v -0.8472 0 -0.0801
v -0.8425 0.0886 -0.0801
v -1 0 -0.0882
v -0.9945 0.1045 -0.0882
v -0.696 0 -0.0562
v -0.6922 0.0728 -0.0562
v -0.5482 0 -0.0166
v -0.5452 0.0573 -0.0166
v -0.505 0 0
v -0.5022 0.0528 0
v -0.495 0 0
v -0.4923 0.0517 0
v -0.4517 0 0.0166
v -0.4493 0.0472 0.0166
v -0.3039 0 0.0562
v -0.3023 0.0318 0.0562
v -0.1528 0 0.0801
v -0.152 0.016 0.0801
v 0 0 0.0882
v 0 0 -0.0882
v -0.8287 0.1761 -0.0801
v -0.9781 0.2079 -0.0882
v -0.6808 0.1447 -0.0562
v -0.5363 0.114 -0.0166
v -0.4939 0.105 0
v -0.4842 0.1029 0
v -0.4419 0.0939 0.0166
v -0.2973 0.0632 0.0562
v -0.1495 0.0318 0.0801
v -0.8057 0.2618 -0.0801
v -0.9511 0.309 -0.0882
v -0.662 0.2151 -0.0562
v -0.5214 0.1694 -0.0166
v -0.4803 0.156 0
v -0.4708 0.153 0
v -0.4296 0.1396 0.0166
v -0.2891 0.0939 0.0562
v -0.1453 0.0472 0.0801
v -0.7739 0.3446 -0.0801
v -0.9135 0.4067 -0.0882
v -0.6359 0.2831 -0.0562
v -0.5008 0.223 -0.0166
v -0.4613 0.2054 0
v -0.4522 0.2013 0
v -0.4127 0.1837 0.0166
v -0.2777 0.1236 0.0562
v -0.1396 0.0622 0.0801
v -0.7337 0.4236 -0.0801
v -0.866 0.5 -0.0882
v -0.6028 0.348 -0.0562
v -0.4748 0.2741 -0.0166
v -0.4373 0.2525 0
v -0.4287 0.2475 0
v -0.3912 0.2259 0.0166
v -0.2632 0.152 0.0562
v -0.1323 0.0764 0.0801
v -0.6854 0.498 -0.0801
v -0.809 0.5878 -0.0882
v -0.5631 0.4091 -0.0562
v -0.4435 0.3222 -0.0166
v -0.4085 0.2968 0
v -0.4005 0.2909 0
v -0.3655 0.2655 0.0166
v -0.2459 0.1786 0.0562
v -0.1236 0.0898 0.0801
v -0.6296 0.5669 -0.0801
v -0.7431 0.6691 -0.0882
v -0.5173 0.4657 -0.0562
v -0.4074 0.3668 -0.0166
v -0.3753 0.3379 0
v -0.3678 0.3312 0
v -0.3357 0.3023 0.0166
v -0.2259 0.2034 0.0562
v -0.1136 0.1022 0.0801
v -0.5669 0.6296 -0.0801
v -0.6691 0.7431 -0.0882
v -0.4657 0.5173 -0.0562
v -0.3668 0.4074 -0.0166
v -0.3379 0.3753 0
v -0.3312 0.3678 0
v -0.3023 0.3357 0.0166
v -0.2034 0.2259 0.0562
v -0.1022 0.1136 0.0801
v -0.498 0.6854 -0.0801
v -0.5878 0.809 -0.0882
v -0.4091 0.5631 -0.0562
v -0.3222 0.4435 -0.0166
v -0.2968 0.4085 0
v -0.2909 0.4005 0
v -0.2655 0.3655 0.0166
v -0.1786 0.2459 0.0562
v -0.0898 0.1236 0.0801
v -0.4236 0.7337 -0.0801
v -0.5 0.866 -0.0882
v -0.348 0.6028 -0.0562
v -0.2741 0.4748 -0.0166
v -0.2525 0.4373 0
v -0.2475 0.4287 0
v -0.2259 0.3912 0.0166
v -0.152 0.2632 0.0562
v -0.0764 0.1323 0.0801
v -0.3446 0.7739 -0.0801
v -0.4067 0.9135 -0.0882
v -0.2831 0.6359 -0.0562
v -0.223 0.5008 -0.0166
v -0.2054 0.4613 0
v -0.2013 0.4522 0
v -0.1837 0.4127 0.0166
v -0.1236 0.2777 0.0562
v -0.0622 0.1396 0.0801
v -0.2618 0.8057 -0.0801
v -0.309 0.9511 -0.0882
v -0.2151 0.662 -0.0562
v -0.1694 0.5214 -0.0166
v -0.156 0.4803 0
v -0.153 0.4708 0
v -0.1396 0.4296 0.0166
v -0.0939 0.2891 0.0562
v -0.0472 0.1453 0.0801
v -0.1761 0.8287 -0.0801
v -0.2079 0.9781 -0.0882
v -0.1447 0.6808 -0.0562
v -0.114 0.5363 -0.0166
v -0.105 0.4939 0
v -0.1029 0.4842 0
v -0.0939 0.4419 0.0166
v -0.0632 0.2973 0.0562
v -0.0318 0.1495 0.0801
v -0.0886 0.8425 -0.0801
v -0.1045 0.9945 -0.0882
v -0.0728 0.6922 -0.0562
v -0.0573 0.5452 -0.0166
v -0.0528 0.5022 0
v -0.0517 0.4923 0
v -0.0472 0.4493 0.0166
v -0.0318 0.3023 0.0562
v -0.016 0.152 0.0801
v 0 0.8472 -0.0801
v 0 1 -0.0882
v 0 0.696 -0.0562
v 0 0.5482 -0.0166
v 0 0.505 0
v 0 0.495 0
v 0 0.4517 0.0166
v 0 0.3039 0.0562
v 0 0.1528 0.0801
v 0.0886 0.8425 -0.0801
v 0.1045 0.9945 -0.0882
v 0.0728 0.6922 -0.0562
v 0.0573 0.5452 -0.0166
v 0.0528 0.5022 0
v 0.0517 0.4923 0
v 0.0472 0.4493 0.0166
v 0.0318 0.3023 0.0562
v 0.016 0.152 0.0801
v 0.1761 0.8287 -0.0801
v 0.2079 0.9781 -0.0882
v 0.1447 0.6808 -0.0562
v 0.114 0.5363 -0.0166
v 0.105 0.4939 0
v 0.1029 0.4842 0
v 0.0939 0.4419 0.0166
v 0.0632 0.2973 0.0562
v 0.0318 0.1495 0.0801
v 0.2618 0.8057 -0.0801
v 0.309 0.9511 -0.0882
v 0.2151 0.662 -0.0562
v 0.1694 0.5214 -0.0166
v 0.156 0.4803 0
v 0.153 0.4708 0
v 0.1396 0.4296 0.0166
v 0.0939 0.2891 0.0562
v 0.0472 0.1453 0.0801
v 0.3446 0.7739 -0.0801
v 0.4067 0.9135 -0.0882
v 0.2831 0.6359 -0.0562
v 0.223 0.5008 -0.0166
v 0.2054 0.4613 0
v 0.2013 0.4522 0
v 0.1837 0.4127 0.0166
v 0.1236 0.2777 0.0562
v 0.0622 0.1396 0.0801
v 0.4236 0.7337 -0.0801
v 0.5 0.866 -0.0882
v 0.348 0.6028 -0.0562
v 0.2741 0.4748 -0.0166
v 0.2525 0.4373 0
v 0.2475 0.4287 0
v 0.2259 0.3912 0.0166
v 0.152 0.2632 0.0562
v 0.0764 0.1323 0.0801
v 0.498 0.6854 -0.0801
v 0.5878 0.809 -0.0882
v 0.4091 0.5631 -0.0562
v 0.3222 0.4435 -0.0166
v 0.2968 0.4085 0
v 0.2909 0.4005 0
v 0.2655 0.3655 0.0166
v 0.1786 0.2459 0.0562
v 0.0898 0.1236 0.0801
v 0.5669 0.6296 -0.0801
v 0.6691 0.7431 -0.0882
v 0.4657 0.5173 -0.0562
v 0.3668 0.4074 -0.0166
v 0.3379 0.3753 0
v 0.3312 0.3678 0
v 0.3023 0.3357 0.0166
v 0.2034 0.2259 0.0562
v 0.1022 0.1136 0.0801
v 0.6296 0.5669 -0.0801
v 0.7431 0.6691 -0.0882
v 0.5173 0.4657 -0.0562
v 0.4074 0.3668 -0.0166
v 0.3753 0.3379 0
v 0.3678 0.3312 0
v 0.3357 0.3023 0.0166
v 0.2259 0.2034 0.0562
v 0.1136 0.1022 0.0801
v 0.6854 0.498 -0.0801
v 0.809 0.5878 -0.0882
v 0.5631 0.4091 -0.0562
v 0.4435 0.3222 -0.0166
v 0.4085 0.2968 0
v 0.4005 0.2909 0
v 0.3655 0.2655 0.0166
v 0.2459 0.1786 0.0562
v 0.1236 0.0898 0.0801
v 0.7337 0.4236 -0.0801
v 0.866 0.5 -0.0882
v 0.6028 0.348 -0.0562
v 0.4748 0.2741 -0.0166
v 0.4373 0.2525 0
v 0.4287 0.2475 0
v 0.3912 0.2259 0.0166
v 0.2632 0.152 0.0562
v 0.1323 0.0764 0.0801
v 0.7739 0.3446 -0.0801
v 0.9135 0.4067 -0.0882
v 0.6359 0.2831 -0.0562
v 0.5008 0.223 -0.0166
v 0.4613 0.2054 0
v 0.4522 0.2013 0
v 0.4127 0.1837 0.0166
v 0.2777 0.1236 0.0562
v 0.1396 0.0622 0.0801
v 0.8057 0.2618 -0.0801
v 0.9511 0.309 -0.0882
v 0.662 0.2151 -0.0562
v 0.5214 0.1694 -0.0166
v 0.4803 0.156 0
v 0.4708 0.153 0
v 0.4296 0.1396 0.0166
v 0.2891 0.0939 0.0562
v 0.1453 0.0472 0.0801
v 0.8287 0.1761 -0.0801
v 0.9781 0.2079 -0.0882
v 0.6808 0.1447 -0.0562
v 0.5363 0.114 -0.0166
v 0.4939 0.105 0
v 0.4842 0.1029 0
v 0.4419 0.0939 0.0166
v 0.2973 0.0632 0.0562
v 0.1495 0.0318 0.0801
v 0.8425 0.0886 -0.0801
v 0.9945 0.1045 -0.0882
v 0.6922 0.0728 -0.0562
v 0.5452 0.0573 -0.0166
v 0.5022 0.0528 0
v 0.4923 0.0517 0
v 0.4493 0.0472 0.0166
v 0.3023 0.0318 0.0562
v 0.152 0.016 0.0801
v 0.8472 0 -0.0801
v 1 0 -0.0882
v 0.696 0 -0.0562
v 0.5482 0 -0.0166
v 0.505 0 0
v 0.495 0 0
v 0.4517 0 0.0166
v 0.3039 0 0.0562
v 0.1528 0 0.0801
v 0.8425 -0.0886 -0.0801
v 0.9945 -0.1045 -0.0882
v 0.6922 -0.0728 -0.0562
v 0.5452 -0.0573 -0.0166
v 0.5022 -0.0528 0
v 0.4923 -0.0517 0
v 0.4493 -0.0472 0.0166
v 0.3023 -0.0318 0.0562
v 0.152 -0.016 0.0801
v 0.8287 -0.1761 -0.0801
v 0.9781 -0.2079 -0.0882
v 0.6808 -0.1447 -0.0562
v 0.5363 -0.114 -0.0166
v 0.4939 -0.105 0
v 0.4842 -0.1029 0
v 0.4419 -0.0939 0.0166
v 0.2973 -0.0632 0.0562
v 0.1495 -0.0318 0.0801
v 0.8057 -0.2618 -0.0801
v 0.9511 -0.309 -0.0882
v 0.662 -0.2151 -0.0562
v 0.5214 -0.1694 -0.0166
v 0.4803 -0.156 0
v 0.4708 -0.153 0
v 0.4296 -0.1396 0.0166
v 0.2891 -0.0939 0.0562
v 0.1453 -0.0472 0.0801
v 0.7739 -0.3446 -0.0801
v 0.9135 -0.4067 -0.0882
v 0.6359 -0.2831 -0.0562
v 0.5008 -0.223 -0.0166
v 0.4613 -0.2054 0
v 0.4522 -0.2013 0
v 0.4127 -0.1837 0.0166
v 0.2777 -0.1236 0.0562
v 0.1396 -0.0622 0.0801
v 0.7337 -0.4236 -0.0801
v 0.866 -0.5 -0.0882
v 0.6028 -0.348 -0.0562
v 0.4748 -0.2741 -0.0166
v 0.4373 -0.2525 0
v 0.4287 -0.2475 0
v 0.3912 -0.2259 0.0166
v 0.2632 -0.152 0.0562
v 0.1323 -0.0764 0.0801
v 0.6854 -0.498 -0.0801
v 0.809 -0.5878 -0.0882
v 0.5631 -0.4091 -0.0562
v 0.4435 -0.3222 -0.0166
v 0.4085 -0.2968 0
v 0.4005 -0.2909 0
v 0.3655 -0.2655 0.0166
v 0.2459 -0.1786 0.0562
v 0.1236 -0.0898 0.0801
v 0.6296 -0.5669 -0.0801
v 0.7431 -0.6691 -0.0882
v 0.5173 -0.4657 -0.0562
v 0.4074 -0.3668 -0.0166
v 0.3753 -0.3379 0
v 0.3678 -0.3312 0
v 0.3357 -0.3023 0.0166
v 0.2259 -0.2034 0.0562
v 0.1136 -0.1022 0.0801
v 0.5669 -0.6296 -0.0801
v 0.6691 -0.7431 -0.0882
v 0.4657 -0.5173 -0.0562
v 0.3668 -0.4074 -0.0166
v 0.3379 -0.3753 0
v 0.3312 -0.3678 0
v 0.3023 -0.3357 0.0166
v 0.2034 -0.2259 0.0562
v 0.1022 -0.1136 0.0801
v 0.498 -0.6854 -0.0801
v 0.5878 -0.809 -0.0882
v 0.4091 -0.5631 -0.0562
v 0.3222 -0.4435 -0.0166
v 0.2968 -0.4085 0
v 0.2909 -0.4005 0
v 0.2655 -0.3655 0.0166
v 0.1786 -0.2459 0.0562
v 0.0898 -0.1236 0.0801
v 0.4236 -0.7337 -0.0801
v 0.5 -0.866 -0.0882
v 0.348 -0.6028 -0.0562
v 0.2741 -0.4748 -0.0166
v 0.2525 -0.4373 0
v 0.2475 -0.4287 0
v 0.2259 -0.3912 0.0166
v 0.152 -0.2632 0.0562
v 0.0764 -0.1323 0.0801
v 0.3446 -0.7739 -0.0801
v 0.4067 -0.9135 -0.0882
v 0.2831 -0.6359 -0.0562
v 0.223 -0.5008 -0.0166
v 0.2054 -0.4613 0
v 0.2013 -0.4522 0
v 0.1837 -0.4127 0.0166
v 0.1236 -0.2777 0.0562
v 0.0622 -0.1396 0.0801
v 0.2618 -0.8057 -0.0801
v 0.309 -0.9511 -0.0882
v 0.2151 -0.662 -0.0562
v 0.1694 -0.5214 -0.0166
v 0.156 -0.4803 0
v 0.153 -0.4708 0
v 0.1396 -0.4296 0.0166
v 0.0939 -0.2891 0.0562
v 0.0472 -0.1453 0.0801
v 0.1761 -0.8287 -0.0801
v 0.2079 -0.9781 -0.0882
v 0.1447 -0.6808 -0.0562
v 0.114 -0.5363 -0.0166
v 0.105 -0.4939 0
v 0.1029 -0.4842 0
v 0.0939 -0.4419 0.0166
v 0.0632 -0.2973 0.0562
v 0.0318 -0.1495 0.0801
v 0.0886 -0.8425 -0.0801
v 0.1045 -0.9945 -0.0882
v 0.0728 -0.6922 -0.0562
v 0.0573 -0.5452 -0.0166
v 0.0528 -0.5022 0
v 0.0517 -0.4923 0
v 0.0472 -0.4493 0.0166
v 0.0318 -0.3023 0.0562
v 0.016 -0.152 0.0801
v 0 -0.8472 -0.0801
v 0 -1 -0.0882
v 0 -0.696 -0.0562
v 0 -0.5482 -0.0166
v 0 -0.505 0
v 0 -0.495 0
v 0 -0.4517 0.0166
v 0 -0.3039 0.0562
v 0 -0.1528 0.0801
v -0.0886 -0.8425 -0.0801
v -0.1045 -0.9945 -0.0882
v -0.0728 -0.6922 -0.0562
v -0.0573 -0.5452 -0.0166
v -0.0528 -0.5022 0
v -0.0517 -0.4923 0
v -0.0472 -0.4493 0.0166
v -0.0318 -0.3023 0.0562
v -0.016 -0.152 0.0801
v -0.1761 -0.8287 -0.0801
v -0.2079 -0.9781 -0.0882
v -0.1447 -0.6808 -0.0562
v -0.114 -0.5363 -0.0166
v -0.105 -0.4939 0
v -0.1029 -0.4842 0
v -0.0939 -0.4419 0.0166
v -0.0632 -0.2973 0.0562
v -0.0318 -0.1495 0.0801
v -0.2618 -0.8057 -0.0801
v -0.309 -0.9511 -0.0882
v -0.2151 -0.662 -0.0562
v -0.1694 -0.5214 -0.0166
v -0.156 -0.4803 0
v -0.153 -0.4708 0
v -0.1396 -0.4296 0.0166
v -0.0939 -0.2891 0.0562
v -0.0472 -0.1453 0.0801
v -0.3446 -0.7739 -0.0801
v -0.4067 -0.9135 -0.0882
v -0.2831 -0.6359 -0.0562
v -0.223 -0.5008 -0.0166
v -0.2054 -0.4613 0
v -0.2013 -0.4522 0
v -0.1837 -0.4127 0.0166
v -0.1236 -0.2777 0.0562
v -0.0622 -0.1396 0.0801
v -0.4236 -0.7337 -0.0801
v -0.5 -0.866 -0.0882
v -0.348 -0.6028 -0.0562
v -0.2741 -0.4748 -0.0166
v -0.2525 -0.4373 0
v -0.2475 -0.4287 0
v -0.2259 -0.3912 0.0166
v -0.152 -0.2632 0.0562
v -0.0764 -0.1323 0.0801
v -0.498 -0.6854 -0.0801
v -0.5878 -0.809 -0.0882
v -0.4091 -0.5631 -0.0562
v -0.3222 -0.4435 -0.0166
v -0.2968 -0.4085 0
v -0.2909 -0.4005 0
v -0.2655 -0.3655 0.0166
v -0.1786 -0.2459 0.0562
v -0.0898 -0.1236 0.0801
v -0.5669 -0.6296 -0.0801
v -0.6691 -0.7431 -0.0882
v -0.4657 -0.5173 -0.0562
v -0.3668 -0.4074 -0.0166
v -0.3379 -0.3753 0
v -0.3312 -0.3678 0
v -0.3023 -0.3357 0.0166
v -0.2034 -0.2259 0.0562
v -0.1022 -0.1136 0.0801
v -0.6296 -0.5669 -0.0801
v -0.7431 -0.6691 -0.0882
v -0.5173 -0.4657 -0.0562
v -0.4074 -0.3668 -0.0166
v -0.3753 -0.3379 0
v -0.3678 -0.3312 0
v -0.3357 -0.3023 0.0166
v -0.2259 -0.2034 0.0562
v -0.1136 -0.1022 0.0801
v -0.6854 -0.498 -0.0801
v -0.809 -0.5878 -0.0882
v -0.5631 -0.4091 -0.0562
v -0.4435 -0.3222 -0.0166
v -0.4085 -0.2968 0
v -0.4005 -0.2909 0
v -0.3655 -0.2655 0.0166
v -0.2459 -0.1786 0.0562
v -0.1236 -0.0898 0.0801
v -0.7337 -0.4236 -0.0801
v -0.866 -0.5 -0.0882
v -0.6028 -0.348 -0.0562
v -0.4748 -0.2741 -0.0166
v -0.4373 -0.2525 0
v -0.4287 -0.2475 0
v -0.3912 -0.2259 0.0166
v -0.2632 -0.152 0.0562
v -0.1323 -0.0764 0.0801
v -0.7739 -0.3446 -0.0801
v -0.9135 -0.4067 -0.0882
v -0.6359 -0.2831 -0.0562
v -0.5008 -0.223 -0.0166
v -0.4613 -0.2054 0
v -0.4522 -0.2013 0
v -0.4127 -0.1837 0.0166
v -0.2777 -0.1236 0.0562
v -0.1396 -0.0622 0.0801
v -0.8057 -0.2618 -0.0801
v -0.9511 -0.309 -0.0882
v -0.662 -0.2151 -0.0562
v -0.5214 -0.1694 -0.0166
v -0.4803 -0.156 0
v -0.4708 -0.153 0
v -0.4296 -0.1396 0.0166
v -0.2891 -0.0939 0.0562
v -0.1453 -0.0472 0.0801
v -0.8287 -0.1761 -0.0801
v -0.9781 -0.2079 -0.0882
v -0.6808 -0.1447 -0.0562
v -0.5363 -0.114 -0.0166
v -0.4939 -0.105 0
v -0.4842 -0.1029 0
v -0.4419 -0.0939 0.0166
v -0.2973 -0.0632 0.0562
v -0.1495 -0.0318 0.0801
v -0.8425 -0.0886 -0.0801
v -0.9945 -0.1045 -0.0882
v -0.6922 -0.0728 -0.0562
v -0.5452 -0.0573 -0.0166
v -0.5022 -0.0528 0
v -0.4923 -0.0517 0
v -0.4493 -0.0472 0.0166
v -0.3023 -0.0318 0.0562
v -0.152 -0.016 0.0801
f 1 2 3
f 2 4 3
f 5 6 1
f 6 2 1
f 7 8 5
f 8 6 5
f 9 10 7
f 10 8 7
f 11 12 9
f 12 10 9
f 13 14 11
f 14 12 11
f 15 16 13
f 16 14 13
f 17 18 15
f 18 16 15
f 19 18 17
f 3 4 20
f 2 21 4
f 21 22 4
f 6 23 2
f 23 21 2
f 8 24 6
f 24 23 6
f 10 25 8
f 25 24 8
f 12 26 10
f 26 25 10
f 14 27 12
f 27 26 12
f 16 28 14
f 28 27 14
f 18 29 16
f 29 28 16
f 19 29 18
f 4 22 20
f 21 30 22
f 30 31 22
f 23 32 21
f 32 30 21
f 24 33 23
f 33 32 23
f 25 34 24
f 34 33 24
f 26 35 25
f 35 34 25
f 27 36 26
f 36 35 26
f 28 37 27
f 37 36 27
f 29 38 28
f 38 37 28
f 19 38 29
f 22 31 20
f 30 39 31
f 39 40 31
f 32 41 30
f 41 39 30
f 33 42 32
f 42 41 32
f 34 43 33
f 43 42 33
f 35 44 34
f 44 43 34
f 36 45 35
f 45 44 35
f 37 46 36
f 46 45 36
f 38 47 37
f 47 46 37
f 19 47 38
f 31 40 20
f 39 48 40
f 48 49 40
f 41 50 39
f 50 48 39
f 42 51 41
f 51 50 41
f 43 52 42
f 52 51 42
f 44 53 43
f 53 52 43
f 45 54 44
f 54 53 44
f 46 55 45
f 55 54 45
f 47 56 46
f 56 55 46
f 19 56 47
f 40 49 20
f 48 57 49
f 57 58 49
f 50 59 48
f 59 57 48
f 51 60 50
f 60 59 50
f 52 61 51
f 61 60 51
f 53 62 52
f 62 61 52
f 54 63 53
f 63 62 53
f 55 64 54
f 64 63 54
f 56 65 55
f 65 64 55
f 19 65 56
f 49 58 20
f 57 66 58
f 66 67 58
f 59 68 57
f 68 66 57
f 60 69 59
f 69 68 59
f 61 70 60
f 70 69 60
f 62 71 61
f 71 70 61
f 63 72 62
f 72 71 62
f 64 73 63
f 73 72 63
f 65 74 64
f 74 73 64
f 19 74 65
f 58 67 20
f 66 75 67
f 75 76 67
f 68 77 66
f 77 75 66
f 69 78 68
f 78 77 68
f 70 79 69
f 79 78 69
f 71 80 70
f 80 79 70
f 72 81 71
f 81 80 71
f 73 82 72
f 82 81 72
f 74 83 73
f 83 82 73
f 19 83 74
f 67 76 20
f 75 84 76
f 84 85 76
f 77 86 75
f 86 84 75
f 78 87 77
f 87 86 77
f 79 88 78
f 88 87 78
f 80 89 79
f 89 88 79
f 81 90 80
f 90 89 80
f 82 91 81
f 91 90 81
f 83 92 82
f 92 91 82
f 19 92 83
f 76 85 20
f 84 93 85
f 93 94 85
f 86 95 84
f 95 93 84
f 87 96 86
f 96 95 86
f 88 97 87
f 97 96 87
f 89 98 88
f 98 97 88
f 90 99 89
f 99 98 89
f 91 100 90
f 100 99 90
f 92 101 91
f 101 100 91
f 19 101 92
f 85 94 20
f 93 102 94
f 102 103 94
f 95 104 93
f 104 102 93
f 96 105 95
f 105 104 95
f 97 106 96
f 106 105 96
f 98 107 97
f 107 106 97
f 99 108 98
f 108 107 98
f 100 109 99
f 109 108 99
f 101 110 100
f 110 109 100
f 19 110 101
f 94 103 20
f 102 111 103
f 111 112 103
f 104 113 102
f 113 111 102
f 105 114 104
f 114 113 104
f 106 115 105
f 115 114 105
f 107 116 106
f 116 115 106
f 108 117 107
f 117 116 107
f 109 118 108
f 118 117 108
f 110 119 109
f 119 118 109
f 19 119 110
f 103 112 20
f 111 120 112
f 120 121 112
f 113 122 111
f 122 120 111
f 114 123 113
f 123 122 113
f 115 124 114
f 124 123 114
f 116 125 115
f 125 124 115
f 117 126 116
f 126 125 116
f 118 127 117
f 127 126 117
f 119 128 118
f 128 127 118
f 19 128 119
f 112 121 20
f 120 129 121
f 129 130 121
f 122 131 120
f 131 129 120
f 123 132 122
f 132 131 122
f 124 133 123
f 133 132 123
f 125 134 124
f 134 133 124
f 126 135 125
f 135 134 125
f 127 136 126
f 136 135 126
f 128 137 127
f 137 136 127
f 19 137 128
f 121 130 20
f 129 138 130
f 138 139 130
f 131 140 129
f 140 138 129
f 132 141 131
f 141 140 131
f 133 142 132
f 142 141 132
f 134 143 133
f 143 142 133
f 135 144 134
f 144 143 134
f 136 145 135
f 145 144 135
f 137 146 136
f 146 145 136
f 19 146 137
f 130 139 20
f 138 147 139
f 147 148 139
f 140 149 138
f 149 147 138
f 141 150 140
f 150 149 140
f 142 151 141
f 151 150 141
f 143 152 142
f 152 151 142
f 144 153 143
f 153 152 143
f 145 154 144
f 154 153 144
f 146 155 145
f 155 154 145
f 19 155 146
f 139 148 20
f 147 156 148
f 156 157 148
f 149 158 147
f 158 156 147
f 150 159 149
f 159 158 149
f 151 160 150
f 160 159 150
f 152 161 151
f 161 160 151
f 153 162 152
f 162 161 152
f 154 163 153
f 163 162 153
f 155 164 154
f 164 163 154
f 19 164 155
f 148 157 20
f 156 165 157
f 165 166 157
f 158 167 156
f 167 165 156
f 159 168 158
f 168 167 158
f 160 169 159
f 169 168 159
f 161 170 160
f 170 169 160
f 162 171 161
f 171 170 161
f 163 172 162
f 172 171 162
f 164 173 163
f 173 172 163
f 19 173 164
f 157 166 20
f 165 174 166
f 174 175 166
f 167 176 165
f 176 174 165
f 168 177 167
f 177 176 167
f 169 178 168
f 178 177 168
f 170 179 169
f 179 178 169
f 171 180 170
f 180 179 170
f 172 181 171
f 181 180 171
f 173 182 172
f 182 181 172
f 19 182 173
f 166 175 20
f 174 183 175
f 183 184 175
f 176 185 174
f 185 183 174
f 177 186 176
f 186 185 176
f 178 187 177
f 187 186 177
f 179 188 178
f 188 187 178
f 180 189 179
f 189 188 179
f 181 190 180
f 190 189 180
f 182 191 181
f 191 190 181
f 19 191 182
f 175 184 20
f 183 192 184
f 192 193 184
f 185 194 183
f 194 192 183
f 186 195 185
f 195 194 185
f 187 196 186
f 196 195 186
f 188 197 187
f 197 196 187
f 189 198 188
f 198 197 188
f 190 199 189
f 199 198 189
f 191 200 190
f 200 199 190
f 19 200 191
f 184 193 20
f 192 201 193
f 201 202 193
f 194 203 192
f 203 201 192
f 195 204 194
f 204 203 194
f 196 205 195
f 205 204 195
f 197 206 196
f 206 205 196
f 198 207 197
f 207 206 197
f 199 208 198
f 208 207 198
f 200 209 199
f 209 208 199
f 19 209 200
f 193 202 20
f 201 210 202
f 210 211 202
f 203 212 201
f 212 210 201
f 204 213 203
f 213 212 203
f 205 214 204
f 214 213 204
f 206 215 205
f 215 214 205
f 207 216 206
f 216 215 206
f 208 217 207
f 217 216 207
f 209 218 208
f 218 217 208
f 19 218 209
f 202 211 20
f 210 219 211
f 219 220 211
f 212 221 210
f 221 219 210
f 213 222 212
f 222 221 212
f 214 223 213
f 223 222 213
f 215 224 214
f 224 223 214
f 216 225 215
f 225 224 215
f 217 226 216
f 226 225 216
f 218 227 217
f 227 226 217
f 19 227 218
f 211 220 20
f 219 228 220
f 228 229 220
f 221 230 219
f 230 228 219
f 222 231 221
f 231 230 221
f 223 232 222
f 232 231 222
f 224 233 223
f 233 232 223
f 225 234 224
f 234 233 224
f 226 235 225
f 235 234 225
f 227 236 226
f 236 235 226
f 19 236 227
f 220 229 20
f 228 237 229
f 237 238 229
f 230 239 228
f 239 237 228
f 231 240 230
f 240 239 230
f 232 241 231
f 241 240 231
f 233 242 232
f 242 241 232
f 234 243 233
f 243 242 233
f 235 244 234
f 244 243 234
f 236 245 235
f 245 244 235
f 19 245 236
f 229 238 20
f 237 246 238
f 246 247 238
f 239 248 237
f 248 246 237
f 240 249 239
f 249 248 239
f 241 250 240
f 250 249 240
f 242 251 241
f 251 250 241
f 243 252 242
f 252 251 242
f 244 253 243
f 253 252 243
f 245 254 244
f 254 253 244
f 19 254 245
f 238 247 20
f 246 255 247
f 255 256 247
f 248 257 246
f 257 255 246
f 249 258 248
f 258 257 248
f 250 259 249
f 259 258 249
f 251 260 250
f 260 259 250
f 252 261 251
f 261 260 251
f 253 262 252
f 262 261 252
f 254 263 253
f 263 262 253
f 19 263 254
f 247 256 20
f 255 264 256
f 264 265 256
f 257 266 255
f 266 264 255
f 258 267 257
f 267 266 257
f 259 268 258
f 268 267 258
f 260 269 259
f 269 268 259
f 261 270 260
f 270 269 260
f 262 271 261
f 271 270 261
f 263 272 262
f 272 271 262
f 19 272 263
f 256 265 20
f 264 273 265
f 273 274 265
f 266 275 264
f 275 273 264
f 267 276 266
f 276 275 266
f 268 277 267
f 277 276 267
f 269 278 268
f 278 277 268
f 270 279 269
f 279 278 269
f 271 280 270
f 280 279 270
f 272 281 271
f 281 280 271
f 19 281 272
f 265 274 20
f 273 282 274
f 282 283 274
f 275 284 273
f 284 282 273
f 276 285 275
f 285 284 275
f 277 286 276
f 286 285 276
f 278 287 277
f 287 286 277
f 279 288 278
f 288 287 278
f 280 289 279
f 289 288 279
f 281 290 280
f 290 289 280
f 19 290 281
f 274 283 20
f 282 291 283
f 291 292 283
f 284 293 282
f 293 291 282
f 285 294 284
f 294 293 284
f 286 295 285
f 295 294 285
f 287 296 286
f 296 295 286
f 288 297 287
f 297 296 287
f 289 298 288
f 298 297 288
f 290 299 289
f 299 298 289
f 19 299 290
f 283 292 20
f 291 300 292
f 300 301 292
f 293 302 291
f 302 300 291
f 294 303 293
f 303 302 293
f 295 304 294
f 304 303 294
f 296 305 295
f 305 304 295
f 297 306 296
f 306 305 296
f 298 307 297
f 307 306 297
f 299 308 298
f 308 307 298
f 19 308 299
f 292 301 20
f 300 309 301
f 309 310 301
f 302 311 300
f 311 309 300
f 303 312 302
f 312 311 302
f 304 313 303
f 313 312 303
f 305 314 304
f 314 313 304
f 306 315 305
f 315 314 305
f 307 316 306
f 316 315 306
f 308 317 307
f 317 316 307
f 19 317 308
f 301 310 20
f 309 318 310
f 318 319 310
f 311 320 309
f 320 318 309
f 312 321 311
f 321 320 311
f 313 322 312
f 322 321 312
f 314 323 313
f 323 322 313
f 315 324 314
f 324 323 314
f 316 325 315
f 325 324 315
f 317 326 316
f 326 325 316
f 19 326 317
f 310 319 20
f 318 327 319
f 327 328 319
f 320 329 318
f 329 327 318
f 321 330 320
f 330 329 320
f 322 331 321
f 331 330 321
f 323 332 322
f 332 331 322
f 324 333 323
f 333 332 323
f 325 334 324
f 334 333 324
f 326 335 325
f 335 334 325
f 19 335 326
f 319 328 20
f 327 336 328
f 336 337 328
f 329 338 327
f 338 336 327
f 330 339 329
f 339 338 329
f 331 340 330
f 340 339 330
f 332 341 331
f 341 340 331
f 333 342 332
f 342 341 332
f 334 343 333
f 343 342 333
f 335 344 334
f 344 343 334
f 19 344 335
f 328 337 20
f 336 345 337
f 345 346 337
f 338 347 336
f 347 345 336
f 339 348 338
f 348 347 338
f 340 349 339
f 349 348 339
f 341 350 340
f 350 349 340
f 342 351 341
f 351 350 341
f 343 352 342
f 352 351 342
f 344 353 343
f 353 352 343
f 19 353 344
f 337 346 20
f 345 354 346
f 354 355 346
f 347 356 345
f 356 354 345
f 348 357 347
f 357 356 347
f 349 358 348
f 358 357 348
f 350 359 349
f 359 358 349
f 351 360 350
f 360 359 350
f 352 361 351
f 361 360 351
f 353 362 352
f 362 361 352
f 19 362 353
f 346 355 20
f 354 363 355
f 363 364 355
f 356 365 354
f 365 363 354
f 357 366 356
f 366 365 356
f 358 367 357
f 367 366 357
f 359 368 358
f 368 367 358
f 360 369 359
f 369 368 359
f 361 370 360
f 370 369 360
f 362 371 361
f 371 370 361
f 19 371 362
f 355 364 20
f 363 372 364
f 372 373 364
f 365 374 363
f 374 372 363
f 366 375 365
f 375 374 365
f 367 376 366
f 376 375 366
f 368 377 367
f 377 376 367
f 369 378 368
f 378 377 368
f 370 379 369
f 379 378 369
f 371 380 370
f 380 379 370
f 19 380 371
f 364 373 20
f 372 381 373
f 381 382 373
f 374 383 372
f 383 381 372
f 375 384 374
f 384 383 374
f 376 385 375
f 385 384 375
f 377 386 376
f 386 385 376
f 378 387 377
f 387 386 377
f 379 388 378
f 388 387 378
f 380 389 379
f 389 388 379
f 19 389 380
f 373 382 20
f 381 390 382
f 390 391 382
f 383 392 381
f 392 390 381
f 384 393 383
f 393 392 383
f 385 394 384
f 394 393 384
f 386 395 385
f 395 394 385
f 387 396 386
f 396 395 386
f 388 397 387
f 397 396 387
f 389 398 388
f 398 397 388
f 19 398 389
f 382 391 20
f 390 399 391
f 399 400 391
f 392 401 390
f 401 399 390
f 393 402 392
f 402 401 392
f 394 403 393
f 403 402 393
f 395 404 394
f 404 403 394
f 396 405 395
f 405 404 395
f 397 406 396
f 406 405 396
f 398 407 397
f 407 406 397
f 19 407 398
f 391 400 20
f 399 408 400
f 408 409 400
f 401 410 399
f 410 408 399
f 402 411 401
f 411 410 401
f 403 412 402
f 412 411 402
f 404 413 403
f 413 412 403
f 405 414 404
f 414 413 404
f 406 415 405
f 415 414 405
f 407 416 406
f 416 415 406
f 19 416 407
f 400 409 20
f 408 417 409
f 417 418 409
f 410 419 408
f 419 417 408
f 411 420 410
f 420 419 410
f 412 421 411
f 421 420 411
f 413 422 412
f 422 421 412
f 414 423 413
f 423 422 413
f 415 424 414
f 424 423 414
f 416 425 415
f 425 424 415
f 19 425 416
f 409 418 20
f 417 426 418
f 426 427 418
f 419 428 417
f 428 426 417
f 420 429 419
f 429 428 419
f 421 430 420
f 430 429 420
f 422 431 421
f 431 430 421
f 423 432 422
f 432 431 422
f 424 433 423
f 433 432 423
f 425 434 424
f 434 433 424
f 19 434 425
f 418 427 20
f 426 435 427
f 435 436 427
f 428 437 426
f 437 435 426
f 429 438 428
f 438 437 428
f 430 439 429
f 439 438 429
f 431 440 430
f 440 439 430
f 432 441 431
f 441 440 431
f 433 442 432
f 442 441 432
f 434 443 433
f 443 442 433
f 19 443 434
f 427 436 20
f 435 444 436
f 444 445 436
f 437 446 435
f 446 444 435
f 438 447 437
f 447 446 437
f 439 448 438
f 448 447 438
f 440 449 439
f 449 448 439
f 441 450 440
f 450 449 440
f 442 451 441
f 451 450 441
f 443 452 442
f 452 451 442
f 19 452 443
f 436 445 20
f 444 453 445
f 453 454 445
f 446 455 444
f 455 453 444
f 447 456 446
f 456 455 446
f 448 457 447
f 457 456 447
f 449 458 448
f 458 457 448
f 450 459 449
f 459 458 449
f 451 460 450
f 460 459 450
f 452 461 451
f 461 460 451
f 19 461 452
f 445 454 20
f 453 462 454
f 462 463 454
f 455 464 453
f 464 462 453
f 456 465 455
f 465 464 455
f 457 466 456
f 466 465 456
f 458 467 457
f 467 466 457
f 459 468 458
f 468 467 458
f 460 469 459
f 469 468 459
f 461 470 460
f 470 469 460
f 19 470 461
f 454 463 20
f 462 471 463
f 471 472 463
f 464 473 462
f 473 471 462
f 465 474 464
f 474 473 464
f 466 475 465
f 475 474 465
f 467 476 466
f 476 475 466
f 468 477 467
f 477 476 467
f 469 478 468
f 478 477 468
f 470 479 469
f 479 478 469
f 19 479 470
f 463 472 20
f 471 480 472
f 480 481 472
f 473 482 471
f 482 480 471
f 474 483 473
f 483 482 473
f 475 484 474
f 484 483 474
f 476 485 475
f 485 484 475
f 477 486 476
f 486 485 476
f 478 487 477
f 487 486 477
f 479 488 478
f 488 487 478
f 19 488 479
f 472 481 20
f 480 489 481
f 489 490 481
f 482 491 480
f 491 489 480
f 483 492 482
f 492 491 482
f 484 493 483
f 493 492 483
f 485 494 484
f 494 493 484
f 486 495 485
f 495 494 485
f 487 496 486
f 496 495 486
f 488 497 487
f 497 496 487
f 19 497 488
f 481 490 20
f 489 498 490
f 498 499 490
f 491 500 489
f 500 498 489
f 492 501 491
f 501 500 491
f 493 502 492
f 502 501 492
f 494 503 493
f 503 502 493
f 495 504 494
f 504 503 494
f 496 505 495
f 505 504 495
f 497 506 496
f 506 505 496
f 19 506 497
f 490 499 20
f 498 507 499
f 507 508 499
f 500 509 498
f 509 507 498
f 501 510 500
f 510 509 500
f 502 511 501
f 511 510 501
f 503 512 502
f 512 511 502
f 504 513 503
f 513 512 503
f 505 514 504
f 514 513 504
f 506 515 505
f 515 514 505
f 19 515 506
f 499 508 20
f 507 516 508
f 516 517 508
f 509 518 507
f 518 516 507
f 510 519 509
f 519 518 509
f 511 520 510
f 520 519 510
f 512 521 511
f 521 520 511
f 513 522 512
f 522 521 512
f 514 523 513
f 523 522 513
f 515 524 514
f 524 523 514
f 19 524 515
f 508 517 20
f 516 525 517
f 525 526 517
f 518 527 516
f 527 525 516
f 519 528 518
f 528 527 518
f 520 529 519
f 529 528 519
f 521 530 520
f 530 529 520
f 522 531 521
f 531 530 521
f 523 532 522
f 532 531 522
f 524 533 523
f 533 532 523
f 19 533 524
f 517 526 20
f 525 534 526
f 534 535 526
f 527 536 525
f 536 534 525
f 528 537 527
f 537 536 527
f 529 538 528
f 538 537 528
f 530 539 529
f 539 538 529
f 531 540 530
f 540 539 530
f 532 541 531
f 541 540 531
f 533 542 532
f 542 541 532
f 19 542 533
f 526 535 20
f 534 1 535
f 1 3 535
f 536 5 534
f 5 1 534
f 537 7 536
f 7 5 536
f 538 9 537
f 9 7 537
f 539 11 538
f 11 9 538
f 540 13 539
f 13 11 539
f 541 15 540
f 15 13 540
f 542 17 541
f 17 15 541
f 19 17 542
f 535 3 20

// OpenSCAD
// file: utils.scad
/**
 * Generate an array containing the end points of a regular polygon
 *
 * @param number n           amount of sides / corners
 * @param number r           radius of the polygon
 * @param string radius_type either "inscribed" or "circumscribed"
*/
function regular_polygon_points(n, r=1, radius_type="inscribed") =
    [for(a = [0:360/n:360]) 
        [cos(a) * (radius_type == "inscribed" ? r : r / cos(180 / n)),
         sin(a) * (radius_type == "inscribed" ? r : r / cos(180 / n))]
    ];

/**
 * Repeat a shape over a pattern. Shape is placed on the corners
 *
 * @param number h           height of the prism
 * @param number n           amount of sides / corners
 * @param number r           radius of the polygon
 * @param string radius_type either "inscribed" or "circumscribed"
 */
module circular_pattern(n, r=1, radius_type="inscribed") {
    points = regular_polygon_points(n, r, radius_type);
    for(p=[0:len(points) - 1]) {
        translate([points[p][0], points[p][1], 0])
        for(i=[0,$children-1]){
            children(i);
         }
    }
}

/**
 * Like mirror, but keeps the original shape
 * 
 * @param vector v The normal vector on the mirror plane. See mirror()
 */
module symmetry(v=[0,0,0]) 
{ 
    children(); 
    mirror(v) children(); 
}

/**
 * Skew an object over six angles:
 *
 * @param array angles 6 angles in the following order:
 *        x along y
 *        x along z
 *        y along x
 *        y along z
 *        z along x
 *        z along y
 */
module skew(angles) {
matrix = [
	[ 1, tan(angles[0]), tan(angles[1]), 0 ],
	[ tan(angles[2]), 1, tan(angles[3]), 0 ],
	[ tan(angles[4]), tan(angles[5]), 1, 0 ],
	[ 0, 0, 0, 1 ]
];
multmatrix(matrix)
children();
}

/**
 * Moves an object up the Z-axis
 *
 * @param number distance The distance it should be moved
 */
module up(distance = 0) {
	translate([0,0,distance]) children();
}

/**
 * Moves an object down the Z-axis
 *
 * @param number distance The distance it should be moved
 */
module down(distance = 0) {
	translate([0,0,-distance]) children();
}

/**
 * Moves an object up the X-axis
 *
 * @param number distance The distance it should be moved
 */
module right(distance = 0) {
	translate([distance,0,0]) children();
}

/**
 * Moves an object down the X-axis
 *
 * @param number distance The distance it should be moved
 */
module left(distance = 0) {
	translate([-distance,0,0]) children();
}
/**
 * Moves an object up the Y-axis
 *
 * @param number distance The distance it should be moved
 */
module back(distance = 0) {
	translate([0,distance,0]) children();
}

/**
 * Moves an object down the Y-axis
 *
 * @param number distance The distance it should be moved
 */
module front(distance = 0) {
	translate([0,-distance,0]) children();
}

/**
 * Applies a minkowski with a sphere to the object
 *
 * @param number r Radius of the sphere
 */
module smooth(r = 0) {
    for(i = [0:$children - 1]) minkowski() {
        children(i);
        sphere(r);
    }
}
// main file
use <utils.scad>

/**
 * A regular 2d polygon
 *
 * @param number n           amount of sides / corners
 * @param number r           radius of the polygon
 * @param string radius_type either "inscribed" or "circumscribed"
*/
module regular_polygon(n, r=1, radius_type="inscribed") {
    polygon(regular_polygon_points(n, r, radius_type));
}

/**
 * A 2-d regular polygon extruded to a height
 *
 * @param number h           height of the prism
 * @param number n           amount of sides / corners
 * @param number r           radius of the polygon
 * @param string radius_type either "inscribed" or "circumscribed"
*/
module prism(h, n, r=1, radius_type="inscribed") {
    linear_extrude(h) regular_polygon(n, r, radius_type);
}

/**
 * A square with rounded corners
 *
 * @param vector  v      the same vector a square (width, depth, height)
 * @param number  r      the rounding radius
 * @param boolean center centers the rectangle
 */
module rounded_square(v, r=1, center = false){
	assert(len(v) == 2);
	rv = [v[0] - 2 * r, v[1] - 2 * r];
	
	t = center? [-rv[0] / 2,-rv[1] / 2,] : [r, r];
	
	translate(t) union() {
		square(rv);
		circle(r=r);
		translate([rv[0], 0,0]) circle(r=r);
		translate([0 , rv[1],0]) circle(r=r);
		translate([rv[0], rv[1],0]) circle(r=r);
		
		translate([0,-r,0]) square([rv[0], r]);
		translate([0,rv[1],0]) square([rv[0], r]);
		translate([-r,0,0]) square([r, rv[1]]);
		translate([rv[0],0,0]) square([r, rv[1]]);
	}
}

/**
 * A square/rectangle with a fully rounded short side
 *
 * @param vector  v      the same vector a square (width, depth, height)
 * @param boolean center centers the rectangle
 */
module slot(v, center) {
	d = min(v[0], v[1]);
	rounded_square(v, r=d/2, center=center);
}

/**
 * Extruded rounded_square
 */
module plate(v, r=1, center=false) {
	assert(len(v) == 3);
	dist = center? v[2] / 2 : 0;
	down(dist) linear_extrude(v[2]) rounded_square([v[0], v[1]],r=r, center=center);
}


/**
 * A plate without any sharp edges
 */
module rounded_plate(v, r=undef, center=false) {
	assert( (len(v) == 2 && ! is_undef(r)) || (len(v) == 3 && is_undef(r)));
	radius = r == undef ? v[2] / 2 : r;
	rv = [v[0] / 2 - radius,  v[1] / 2 - radius, 2*radius];
    t = center ? [0, 0, 0] : [v[0]  / 2, v[1] / 2, radius];
    translate(t) symmetry([1,0,0]) symmetry([0,1,0]) {
        translate([rv[0], rv[1], 0]) sphere(radius);
        right(rv[0]) rotate([270, 0,0]) cylinder(rv[1], r=radius);
        back(rv[1]) rotate([0, 90,0]) cylinder(rv[0], r=radius);
        down(radius) cube(rv);
    }
}

/**
 * Extruded slot
 */
module bar(v, center=false) {
	assert(len(v) == 3);
	dist = center? v[2] / 2 : 0;
	down(dist) linear_extrude(v[2]) slot([v[0], v[1]], center=center);
}

/**
 * A bar without any sharp edges
 */
module rounded_bar(v, center=false) {
    rounded_plate(v, center);
}

/**
 * A cylinder without any sharp edges
 */
module rounded_cylinder(h, r, center=false) {
    t = center ? [0, 0, -h/2] : [0, 0, 0];
    translate(t) {
        up(r) sphere(r=r);
        up(r) cylinder(h=h-2*r,r=r);
        up(h - r) sphere(r=r);
    }
}

/**
 *  A cube without sharp edges
 */
module rounded_cube(v, r=1, center=false) {
    assert(r <= min(v) / 2);
    t = center? [-v[0]/2,-v[1]/2,-v[2]/2]: [0,0,0];
    translate(t) {
        rounded_plate([v[0], v[1]], r=r);
        up(r) plate([v[0], v[1], v[2] - 2 * r], r);
        up(v[2] - 2 * r) rounded_plate([v[0], v[1]], r=r);
   }
}

/**
 * A 2 cylinder difference
 */
module tube(h , ir=undef, or=undef, id=undef, od=undef, t = 1) {
     ir = is_undef(ir)? id / 2 : ir;
    or = is_undef(or)? od/ 2 : or;
    
    r = is_undef(or)? ir + t : or;
    assert(! is_undef(r));
    
    difference() {
        cylinder(h, r=r);
        down($preview? 0.05 : 0) cylinder($preview? h+0.1: h, r=r - t);
    }
}

/**
 * A donut-shaped object
 */
module torus(h, ir=undef, or=undef, id=undef, od=undef) {
    ir = is_undef(ir)? id / 2 : ir;
    or = is_undef(or)? od/ 2 : or;
    
    r = is_undef(ir)? or - h/2 : ir + h/2;
    
    assert(! is_undef(r));
    rotate_extrude() right(r) circle(r=h/2);
}

/**
 * An ellipsiod, filleted
 */
module bulge(r=1, slope=45) {
   rotate_extrude() scale( 1 / (2 * sin(slope))) {
       intersection() {translate([0,-cos(slope)]) circle(1); square([1,1]);}
       difference() {
            translate([0, - 1 + cos(slope)])square([2*sin(slope), 1 - cos(slope)]);
            translate([2*sin(slope),cos(slope)])circle(1);
       }
   }
}

//bar([10, 2, 1], true);
$fn = 60;
bulge(slope=20);
//back(10) bar([10, 2, 1]);
//rounded_bar([10, 2, 1]);
//rounded_cube([30,20,10], 4, true);
